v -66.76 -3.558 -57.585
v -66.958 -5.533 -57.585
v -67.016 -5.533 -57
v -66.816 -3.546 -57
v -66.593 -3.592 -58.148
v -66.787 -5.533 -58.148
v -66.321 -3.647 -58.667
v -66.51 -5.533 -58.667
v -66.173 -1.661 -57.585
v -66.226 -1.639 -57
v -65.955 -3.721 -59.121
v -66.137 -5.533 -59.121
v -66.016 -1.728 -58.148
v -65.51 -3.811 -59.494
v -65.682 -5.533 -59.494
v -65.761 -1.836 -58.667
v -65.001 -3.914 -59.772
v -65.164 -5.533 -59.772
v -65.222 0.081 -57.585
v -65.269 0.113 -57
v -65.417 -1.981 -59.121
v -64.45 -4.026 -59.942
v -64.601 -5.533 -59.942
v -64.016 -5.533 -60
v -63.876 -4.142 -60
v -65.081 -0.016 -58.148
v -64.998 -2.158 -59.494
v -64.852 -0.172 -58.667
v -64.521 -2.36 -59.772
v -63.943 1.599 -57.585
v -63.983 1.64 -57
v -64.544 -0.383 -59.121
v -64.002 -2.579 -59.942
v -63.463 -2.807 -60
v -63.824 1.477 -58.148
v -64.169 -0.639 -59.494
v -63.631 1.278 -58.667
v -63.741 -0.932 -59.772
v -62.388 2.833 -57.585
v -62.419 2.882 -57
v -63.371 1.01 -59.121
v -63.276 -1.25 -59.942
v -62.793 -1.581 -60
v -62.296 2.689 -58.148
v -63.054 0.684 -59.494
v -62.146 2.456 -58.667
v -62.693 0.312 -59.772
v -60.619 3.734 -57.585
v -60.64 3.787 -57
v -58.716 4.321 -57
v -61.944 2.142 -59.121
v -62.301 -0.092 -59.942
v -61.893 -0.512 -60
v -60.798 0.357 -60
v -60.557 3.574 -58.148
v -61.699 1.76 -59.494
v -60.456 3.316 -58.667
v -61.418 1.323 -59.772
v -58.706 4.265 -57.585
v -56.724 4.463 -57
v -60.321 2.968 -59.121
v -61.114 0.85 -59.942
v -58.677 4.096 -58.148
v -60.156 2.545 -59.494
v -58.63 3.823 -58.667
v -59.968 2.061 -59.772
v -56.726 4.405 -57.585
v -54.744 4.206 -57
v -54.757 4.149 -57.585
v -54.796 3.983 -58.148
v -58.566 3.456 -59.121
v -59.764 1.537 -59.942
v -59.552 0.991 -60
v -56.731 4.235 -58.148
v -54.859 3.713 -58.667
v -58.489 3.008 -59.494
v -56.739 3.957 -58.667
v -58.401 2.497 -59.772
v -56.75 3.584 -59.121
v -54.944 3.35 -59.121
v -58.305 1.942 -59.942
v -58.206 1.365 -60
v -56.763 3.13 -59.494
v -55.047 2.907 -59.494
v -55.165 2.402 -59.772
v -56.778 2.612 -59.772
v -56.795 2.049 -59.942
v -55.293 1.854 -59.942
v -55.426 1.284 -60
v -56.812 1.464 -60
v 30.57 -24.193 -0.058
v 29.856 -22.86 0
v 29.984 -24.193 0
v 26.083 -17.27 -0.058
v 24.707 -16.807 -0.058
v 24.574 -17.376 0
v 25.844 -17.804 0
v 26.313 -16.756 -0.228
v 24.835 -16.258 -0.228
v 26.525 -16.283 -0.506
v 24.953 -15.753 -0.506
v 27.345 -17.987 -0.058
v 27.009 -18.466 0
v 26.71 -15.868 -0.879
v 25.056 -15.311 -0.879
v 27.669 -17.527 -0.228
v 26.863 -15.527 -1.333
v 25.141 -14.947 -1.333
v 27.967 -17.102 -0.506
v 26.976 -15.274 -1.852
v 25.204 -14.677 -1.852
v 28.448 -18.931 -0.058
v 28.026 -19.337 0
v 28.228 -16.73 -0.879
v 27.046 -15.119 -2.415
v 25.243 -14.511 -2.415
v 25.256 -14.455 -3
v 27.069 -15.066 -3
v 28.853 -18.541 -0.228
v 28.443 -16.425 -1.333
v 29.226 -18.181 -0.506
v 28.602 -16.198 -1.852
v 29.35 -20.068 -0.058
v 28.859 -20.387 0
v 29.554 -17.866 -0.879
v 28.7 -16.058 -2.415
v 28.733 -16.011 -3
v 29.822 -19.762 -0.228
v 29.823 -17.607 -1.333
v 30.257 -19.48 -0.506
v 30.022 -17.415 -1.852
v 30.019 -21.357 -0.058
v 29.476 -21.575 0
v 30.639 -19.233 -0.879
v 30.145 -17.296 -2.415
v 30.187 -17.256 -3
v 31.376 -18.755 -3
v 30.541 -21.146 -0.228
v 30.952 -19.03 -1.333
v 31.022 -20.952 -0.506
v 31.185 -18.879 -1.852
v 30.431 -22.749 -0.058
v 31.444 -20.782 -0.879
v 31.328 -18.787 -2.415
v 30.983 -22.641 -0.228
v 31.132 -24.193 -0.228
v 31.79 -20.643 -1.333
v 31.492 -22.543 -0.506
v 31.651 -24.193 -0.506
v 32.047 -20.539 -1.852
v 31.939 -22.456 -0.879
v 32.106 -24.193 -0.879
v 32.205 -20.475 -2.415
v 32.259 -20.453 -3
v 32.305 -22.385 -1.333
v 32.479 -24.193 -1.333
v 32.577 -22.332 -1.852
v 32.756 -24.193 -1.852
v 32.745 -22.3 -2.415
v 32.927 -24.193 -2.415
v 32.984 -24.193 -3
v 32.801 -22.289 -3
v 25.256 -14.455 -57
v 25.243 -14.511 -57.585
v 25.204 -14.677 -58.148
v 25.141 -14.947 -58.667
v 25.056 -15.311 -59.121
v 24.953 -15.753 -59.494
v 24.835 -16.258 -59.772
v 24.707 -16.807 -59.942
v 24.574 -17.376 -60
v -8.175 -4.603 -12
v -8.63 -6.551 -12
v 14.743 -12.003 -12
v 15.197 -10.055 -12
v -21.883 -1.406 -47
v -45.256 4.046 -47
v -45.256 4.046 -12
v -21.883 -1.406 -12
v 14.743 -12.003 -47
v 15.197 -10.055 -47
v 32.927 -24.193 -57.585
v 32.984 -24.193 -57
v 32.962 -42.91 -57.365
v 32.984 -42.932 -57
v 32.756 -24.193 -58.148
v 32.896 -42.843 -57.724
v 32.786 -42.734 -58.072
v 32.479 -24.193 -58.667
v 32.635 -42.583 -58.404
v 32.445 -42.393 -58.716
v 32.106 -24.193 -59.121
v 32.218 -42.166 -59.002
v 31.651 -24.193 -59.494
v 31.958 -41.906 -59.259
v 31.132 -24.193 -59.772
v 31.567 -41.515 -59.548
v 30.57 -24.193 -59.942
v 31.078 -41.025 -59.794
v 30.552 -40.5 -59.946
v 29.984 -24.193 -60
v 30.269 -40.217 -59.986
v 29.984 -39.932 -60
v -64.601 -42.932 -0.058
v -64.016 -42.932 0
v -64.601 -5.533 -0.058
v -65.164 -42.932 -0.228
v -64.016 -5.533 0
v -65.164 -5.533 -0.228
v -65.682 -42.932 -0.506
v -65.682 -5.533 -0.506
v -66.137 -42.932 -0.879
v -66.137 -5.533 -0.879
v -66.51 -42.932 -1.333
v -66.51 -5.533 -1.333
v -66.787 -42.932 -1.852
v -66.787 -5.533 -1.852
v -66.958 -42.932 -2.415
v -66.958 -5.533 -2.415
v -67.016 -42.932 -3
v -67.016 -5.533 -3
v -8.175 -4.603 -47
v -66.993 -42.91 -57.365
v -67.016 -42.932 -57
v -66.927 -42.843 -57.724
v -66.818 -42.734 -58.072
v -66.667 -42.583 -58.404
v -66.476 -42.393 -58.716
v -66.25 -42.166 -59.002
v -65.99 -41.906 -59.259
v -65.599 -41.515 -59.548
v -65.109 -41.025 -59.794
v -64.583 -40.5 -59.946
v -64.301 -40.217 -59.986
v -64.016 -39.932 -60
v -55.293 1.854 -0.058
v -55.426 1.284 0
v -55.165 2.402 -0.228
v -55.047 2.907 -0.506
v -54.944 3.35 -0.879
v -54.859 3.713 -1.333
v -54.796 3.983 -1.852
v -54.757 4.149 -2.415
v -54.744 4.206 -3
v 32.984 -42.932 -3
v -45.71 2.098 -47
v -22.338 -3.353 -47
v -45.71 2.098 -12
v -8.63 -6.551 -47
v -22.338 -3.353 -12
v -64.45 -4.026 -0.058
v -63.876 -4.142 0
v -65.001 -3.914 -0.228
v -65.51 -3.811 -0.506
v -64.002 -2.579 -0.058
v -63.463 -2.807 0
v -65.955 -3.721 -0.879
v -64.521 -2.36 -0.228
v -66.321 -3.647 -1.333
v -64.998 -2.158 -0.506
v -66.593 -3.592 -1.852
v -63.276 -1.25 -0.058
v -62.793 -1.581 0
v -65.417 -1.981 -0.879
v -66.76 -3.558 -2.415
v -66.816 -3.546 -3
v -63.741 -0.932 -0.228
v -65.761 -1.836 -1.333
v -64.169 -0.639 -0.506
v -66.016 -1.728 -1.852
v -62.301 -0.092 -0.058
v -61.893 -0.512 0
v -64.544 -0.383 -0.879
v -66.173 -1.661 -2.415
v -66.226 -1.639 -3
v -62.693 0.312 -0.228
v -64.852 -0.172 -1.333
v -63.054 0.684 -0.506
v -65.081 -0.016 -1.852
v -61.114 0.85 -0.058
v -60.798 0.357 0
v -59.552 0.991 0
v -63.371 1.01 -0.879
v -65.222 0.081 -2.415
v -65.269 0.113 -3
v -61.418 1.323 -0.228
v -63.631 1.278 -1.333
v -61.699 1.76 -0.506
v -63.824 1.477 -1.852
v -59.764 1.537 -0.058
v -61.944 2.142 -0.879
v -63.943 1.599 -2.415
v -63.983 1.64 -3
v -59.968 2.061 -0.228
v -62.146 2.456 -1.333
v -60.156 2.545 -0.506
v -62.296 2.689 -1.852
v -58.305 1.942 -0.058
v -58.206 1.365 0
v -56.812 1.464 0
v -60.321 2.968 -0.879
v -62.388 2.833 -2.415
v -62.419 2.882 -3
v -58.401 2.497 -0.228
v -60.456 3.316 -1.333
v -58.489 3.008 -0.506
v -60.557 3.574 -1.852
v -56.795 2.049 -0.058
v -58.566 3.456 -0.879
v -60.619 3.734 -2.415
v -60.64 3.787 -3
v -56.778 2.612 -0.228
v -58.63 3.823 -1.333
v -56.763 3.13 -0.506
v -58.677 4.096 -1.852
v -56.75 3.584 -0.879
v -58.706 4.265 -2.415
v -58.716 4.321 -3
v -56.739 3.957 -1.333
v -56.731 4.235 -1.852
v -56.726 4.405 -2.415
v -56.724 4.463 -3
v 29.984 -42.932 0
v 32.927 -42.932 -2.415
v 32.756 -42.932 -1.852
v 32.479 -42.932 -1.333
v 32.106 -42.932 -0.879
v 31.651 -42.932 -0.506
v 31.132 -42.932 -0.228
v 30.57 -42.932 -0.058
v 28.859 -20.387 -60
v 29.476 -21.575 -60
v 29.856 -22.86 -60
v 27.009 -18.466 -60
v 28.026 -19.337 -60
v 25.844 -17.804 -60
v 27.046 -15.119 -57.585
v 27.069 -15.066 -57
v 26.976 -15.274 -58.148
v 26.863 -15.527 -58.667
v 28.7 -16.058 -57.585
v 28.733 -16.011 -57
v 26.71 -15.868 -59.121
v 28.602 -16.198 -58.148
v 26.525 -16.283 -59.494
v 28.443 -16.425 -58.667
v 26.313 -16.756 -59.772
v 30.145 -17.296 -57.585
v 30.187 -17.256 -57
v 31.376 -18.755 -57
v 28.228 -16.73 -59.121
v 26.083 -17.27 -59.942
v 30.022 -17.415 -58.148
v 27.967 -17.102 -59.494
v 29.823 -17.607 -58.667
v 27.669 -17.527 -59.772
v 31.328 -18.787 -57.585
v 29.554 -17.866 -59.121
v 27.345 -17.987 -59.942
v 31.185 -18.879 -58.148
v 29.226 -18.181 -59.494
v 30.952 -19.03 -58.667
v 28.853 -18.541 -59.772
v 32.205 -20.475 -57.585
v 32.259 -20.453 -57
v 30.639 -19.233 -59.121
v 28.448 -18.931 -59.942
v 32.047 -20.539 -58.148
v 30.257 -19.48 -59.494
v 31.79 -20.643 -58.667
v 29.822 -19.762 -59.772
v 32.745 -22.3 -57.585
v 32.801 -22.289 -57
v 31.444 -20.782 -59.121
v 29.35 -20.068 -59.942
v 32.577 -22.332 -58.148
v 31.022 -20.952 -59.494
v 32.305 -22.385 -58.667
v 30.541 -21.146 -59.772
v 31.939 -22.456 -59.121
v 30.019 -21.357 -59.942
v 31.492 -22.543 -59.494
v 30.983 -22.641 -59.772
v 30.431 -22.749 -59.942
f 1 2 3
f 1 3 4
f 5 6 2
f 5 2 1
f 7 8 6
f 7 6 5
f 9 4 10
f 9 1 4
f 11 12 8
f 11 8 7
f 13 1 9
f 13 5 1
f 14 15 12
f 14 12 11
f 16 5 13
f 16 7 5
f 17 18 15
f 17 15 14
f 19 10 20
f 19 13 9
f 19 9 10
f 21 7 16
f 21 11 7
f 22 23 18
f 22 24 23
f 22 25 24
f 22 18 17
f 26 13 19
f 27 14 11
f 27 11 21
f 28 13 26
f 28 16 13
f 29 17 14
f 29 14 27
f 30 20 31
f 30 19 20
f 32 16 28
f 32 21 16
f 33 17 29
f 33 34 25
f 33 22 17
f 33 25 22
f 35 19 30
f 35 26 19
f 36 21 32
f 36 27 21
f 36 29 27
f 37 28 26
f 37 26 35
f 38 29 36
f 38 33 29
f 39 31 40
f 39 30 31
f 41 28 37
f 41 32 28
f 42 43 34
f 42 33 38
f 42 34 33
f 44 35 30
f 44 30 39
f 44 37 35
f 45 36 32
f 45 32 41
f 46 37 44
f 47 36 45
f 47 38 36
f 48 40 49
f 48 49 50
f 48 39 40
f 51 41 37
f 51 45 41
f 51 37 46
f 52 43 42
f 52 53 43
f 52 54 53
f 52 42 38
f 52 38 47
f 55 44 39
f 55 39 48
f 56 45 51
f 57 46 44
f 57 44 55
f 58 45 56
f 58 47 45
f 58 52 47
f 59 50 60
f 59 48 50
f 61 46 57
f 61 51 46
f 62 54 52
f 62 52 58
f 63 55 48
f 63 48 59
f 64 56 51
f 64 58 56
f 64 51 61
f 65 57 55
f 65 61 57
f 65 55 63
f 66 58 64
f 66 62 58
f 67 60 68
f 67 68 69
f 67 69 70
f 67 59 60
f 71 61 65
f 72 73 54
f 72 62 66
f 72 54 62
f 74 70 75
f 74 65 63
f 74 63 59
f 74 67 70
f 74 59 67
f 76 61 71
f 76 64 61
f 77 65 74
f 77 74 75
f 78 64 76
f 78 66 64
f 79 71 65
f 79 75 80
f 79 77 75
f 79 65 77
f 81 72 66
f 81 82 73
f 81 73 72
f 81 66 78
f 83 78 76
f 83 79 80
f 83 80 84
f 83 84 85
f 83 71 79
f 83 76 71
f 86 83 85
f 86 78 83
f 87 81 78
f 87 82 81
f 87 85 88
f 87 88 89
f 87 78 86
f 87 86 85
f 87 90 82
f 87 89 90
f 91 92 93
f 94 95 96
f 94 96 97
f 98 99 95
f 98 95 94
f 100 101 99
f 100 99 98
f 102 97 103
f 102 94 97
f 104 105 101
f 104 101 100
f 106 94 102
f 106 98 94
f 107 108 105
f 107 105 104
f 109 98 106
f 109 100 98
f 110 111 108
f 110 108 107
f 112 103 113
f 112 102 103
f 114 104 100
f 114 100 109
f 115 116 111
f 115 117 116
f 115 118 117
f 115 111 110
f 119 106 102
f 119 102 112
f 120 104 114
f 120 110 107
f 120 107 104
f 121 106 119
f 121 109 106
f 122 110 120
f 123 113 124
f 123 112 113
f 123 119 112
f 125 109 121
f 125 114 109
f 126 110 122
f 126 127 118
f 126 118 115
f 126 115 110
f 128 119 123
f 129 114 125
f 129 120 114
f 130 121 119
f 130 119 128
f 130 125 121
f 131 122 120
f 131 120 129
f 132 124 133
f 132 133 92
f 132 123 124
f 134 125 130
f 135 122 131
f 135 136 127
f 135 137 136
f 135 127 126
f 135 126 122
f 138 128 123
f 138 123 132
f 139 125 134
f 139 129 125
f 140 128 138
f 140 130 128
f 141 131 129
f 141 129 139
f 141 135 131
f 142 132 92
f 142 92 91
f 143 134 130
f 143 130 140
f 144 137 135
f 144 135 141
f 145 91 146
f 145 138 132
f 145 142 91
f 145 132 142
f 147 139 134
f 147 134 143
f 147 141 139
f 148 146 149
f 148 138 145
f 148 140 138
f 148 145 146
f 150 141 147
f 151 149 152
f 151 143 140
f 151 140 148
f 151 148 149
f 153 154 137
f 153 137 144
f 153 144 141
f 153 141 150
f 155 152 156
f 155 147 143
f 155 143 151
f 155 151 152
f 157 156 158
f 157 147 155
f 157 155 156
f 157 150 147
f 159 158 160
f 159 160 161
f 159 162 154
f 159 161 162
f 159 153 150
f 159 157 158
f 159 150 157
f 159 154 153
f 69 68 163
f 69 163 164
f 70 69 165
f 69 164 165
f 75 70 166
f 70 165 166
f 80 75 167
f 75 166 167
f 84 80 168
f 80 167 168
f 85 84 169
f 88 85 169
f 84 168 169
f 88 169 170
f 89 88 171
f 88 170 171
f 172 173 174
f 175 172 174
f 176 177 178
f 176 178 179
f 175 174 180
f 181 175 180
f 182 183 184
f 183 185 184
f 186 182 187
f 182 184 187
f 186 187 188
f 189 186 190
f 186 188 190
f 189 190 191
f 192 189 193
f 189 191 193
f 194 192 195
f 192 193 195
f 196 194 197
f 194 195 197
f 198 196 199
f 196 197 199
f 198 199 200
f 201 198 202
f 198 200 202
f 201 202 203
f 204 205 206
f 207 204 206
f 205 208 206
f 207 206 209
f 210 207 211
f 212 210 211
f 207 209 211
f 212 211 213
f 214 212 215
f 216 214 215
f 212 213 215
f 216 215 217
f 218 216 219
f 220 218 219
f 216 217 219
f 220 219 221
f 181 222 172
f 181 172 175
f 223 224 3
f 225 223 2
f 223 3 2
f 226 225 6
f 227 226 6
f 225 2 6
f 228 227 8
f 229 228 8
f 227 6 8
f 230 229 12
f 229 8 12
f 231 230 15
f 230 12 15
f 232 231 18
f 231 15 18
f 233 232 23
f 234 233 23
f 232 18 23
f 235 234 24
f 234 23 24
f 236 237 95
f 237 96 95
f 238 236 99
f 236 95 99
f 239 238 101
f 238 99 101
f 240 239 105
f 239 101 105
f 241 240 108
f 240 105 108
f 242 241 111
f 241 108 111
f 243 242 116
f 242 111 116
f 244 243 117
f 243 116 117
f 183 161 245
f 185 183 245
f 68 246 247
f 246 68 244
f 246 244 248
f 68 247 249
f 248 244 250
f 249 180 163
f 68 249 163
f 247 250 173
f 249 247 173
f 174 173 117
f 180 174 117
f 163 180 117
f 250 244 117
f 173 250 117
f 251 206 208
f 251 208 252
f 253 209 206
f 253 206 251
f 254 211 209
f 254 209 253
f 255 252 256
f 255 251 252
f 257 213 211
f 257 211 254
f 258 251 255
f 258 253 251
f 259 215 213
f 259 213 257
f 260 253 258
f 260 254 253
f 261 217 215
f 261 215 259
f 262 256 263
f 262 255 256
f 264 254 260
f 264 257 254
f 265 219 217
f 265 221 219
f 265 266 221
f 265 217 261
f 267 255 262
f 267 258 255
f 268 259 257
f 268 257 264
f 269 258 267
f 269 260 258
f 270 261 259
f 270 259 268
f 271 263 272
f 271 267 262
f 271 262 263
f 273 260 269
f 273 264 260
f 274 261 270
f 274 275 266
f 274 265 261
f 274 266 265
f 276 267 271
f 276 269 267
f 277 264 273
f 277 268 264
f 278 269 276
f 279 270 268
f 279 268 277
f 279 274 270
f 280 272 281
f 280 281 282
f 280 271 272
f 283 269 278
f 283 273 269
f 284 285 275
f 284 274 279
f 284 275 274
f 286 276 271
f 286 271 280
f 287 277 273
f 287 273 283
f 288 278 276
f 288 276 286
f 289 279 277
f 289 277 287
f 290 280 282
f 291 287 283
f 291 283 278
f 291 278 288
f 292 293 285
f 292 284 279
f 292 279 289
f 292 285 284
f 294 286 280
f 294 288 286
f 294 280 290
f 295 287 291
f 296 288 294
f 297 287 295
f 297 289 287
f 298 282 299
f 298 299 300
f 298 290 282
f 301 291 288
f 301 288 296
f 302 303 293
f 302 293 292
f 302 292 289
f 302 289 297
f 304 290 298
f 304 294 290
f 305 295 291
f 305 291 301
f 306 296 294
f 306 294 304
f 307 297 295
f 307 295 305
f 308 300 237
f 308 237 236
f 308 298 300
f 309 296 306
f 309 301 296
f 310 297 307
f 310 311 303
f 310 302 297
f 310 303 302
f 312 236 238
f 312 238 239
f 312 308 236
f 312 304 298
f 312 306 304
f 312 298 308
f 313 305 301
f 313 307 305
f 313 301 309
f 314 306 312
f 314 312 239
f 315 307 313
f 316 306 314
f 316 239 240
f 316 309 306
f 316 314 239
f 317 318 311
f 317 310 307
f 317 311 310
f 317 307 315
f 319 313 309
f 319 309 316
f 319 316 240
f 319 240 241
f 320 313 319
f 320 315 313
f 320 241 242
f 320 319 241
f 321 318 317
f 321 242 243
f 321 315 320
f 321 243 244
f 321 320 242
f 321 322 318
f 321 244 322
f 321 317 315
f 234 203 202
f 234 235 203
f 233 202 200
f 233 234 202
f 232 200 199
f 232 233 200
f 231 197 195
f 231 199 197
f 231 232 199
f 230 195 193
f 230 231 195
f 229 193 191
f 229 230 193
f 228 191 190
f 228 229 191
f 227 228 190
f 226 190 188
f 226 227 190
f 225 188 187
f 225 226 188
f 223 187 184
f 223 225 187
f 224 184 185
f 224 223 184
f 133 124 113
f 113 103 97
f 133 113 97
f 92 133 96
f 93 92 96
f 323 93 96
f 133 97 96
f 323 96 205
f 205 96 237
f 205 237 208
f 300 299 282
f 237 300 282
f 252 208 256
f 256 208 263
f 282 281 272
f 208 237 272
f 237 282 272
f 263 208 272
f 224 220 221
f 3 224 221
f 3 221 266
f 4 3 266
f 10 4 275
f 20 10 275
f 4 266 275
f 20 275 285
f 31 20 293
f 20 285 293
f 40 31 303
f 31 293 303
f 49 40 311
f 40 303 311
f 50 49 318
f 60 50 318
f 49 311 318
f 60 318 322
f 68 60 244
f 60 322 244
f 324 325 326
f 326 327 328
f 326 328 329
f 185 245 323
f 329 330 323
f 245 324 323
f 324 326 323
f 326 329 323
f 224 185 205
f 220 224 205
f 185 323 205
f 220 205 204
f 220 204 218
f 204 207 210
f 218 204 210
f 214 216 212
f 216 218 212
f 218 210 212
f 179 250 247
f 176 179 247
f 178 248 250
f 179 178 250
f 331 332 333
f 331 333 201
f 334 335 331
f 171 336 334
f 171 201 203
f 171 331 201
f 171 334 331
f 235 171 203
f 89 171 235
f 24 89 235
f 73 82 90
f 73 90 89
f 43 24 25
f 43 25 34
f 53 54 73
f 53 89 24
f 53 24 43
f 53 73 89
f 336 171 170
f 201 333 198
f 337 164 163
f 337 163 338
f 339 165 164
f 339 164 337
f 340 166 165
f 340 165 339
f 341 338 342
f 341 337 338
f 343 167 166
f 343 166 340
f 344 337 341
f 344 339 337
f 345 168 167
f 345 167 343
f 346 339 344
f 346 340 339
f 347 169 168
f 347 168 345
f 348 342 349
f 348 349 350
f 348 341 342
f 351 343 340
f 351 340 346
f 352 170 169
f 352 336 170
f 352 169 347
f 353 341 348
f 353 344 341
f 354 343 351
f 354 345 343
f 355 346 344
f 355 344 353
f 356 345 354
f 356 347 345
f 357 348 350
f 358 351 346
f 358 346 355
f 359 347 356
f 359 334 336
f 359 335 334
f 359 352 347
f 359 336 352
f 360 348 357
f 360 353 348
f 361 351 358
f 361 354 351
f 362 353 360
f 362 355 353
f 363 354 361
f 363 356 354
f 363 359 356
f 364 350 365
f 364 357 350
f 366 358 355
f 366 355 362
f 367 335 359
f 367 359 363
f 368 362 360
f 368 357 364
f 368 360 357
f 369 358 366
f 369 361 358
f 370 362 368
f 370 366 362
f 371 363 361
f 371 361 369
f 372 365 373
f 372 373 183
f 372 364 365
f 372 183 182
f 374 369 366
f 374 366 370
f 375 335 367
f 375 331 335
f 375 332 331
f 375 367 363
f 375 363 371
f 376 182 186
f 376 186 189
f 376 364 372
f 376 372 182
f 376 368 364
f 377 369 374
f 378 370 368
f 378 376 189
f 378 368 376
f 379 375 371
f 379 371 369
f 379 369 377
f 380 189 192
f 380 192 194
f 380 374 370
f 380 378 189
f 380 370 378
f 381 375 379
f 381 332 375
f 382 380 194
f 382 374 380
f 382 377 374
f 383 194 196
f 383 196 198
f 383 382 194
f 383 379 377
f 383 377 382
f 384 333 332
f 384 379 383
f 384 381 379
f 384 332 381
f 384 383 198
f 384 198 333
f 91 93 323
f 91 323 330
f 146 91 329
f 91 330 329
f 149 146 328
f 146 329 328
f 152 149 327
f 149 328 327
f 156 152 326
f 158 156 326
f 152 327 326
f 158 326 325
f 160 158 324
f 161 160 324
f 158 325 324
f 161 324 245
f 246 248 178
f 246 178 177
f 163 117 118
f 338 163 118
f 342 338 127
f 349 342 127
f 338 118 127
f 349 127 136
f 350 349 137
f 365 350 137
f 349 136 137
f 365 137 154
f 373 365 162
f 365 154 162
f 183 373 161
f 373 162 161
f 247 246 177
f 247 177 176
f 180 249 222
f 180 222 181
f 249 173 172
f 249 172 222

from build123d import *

# Parameters (mm, degrees)
BOSS_EXTRUDE1_DEPTH = 60
SKETCH2_W           = 24
SKETCH2_H           = 35
BOSS_EXTRUDE2_DEPTH = 2
FILLET1_R           = 3


with BuildPart() as part:
    # Sketch1 → Boss-Extrude1 (new body)
    with BuildSketch(Plane.XY):
        with BuildLine():
            Line((-54.744118035, 4.205632013), (25.255881965, -14.454907336))
            ThreePointArc((25.255881965, -14.454907336), (30.817424359, -17.97721097), (32.984293194, -24.193484463))
            Line((32.984293194, -24.193484463), (32.984293194, -42.931937173))
            Line((32.984293194, -42.931937173), (-67.015706806, -42.931937173))
            Line((-67.015706806, -42.931937173), (-67.015706806, -5.532945114))
            ThreePointArc((-67.015706806, -5.532945114), (-63.2319803, 2.300186052), (-54.744118035, 4.205632013))
        make_face()
    extrude(amount=-BOSS_EXTRUDE1_DEPTH)

    # Sketch2 → Boss-Extrude2 (add)
    with BuildSketch(Plane(origin=(-1.894488045, -8.121900487, 0), x_dir=(0.9738577126840912, -0.22715887710083071, 0), z_dir=(0.22715887710083071, 0.9738577126840912, 0))):
        with Locations((-32.992105981, 29.5)):
            Rectangle(SKETCH2_W, SKETCH2_H)
        with Locations((5.084176419, 29.5)):
            Rectangle(SKETCH2_W, SKETCH2_H)
    extrude(amount=BOSS_EXTRUDE2_DEPTH)

    # Fillet1
    fillet1_edges = [part.edges().sort_by_distance(p)[0] for p in [
        (-14.744118035, -5.124637662, -60),
        (-63.2319803, 2.300186052, -60),
        (-67.015706806, -24.232441143, -60),
        (-17.015706806, -42.931937173, -60),
        (32.984293194, -33.562710818, -60),
        (-67.015706806, -24.232441143, 0),
        (-63.2319803, 2.300186052, 0),
        (-14.744118035, -5.124637662, 0),
        (30.817424359, -17.97721097, 0),
        (32.984293194, -33.562710818, 0),
        (30.817424359, -17.97721097, -60),
    ]]
    fillet(fillet1_edges, radius=FILLET1_R)


solid = part.part
